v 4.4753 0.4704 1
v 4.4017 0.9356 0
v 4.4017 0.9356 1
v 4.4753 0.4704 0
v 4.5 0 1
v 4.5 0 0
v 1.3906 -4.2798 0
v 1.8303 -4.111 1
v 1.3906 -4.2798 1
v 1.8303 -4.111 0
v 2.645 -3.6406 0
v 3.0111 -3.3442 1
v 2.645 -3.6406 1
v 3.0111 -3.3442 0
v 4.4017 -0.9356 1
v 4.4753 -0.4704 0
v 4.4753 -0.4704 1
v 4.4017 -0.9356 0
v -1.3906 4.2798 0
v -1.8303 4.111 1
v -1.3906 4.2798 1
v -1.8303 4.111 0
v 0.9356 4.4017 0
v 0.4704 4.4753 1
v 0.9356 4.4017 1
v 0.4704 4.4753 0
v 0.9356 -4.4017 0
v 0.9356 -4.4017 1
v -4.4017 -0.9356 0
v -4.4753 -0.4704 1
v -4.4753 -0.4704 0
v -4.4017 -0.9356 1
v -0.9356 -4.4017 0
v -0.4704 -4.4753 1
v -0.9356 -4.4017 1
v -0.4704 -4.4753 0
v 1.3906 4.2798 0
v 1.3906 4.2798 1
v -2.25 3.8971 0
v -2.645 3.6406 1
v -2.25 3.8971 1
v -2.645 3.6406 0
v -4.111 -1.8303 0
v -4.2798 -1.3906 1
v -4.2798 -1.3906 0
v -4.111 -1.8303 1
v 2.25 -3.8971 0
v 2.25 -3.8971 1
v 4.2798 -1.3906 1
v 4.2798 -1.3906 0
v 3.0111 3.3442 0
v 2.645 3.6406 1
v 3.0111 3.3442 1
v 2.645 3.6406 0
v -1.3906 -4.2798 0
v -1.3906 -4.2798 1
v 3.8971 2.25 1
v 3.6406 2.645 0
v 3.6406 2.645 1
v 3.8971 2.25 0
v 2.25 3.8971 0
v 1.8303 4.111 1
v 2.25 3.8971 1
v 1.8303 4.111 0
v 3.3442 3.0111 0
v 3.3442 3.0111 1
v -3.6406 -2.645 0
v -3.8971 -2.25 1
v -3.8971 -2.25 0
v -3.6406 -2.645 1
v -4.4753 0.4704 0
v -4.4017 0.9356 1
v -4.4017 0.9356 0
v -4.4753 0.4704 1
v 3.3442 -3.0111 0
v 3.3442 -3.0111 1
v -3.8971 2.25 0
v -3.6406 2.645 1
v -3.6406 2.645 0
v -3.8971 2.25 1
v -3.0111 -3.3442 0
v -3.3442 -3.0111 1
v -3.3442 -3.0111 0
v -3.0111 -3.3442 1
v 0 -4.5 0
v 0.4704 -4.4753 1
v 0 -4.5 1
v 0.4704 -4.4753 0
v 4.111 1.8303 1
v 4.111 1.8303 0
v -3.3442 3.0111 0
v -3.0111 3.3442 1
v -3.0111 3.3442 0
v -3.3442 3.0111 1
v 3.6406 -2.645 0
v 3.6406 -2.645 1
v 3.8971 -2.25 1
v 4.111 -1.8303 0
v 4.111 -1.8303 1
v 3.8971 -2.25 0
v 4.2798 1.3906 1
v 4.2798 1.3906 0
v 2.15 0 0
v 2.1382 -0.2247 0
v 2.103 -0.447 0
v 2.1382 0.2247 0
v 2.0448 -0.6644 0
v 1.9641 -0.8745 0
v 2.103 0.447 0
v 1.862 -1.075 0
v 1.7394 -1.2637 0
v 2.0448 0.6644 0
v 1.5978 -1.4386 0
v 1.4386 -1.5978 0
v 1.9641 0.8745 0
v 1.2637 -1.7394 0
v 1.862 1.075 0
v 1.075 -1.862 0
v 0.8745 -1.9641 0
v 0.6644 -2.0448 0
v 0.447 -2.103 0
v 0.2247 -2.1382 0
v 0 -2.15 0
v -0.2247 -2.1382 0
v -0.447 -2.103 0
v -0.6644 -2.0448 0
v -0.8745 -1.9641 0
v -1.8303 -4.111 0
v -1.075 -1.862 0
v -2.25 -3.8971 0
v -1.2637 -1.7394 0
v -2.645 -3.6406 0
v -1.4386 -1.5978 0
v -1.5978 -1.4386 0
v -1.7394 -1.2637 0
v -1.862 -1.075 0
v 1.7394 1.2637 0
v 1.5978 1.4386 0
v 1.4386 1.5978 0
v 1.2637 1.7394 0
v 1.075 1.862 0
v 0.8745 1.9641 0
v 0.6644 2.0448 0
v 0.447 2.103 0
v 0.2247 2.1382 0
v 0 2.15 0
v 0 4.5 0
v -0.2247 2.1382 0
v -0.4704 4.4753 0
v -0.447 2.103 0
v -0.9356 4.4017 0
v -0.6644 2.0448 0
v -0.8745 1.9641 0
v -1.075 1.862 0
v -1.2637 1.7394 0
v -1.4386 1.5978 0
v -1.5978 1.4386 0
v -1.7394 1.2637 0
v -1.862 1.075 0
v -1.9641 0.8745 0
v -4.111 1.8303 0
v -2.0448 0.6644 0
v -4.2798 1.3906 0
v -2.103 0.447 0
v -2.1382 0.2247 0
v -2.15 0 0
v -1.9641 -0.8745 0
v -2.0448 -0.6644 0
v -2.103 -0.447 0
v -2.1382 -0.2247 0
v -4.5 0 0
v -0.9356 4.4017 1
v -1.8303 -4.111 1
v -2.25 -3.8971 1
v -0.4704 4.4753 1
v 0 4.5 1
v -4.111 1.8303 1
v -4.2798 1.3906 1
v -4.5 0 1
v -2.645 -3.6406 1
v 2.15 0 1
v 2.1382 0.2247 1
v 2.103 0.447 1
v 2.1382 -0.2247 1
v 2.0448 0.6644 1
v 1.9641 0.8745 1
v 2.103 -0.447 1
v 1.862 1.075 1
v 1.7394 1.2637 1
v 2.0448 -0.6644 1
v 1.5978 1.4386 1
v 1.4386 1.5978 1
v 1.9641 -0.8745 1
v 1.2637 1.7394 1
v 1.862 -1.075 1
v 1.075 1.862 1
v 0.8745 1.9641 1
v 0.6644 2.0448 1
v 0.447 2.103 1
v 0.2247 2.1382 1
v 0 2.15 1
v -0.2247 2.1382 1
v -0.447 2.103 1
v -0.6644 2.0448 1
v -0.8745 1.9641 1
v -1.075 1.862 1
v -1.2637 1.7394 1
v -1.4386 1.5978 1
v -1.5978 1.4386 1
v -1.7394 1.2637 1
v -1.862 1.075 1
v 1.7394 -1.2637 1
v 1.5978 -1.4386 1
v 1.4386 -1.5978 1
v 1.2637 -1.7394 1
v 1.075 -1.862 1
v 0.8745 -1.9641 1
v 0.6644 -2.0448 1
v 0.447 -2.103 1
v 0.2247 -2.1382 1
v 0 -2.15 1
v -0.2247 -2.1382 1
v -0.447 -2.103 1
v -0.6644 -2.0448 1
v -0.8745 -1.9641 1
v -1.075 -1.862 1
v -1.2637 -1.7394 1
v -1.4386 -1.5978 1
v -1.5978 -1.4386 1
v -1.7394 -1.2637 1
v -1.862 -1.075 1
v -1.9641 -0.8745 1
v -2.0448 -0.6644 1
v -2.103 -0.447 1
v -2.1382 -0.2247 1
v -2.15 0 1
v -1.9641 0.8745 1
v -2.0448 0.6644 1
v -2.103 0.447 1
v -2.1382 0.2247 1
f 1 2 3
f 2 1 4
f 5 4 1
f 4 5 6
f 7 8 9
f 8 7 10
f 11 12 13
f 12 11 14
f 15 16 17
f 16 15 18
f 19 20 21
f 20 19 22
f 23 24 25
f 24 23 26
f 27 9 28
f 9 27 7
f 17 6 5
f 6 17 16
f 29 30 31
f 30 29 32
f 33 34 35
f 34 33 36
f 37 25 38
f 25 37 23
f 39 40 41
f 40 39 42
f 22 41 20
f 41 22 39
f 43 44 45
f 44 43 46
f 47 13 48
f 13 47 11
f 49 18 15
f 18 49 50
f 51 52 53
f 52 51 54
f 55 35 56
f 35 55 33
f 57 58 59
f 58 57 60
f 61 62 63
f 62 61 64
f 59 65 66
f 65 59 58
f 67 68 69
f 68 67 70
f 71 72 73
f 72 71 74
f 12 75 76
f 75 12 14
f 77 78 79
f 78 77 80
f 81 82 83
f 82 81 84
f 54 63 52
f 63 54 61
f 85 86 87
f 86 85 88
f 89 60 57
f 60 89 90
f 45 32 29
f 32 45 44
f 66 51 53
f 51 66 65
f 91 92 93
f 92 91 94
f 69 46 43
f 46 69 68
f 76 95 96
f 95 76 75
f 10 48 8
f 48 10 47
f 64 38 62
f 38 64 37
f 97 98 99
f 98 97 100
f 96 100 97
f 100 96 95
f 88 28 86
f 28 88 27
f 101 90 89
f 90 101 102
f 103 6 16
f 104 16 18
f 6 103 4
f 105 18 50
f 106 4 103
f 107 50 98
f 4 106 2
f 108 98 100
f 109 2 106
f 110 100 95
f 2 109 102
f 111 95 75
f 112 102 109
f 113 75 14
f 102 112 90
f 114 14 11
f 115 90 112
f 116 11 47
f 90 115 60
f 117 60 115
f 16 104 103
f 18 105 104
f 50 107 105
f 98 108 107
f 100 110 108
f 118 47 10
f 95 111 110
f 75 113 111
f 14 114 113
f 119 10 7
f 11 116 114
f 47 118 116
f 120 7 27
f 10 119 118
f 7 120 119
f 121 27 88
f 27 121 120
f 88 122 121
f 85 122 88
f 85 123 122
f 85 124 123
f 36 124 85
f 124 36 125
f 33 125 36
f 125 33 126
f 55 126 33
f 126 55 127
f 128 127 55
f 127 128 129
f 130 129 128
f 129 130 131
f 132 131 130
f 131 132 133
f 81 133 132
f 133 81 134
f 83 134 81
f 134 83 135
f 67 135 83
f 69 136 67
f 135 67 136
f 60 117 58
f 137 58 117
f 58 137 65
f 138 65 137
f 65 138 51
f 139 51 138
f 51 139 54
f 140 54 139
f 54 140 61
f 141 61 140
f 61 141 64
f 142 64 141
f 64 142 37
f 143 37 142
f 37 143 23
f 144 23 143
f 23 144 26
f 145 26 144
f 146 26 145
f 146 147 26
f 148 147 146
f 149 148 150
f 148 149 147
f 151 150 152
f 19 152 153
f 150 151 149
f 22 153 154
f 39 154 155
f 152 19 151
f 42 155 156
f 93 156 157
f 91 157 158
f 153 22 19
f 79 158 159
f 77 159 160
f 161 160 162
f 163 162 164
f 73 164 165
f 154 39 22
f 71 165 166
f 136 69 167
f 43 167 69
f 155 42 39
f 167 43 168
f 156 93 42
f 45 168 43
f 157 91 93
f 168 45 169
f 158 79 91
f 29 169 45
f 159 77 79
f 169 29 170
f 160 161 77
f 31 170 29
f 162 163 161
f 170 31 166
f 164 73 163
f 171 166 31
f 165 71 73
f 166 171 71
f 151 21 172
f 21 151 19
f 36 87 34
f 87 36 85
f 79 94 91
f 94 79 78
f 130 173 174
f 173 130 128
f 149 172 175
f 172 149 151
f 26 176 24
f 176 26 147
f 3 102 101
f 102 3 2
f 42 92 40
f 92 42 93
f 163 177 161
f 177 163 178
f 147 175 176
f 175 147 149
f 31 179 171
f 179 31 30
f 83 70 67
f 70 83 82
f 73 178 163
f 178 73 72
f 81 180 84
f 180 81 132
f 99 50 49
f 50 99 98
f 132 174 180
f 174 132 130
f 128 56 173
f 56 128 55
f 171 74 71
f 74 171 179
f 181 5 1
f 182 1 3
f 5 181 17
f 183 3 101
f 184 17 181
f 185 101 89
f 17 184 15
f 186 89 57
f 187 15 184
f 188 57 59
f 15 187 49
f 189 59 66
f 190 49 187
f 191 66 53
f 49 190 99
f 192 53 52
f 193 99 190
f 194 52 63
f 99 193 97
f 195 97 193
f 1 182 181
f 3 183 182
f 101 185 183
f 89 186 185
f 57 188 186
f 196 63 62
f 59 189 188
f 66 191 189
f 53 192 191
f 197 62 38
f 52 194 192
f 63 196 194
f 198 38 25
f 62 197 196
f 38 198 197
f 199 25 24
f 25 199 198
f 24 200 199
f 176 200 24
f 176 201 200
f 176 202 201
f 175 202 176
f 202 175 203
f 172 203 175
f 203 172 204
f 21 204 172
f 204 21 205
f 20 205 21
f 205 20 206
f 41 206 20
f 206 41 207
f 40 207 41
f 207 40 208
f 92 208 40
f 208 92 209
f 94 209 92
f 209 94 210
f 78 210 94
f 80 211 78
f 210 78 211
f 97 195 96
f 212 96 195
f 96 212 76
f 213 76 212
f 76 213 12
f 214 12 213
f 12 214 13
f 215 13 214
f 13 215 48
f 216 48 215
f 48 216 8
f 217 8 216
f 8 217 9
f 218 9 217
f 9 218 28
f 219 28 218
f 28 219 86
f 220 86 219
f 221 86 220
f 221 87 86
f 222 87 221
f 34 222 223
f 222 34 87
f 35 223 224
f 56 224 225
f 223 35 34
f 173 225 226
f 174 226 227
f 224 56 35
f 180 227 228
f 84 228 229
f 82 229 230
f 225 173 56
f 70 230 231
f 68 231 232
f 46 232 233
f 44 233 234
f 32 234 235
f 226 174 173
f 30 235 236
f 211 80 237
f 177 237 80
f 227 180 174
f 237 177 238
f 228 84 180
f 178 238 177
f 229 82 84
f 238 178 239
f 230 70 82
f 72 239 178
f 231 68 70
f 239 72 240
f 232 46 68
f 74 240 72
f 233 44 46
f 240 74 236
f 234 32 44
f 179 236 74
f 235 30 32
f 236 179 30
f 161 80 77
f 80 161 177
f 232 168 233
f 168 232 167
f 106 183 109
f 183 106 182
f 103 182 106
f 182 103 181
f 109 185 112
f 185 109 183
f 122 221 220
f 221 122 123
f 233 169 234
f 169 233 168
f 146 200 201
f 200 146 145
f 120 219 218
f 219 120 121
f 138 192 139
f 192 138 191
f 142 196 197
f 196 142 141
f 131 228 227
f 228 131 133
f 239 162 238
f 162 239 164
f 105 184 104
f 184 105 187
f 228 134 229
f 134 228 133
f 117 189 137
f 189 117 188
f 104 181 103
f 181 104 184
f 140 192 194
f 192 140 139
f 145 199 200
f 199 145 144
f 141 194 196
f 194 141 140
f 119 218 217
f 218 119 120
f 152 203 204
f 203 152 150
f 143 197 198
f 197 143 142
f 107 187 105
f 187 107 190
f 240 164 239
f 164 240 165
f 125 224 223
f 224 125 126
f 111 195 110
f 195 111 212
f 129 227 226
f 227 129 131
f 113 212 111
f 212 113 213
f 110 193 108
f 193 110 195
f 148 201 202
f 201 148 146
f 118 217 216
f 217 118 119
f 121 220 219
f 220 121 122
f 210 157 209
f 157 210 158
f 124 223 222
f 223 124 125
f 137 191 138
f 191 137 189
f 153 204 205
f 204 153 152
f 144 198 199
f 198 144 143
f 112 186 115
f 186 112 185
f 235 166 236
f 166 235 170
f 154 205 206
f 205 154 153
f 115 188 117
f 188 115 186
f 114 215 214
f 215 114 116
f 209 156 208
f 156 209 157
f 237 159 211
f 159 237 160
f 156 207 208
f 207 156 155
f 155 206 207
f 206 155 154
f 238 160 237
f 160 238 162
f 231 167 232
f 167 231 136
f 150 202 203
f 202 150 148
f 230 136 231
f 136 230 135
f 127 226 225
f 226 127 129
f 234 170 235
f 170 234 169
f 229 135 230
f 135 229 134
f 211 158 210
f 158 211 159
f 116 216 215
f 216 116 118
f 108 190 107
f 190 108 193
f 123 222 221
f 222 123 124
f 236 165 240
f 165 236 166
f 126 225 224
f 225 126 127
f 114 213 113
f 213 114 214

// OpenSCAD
// Flat metric washer.
$fn = 60;
eps = 0.02;
inner_d = 4.3;
outer_d = 9;
thickness = 1;
difference() {
    cylinder(d = outer_d, h = thickness);
    translate([0, 0, -eps]) cylinder(d = inner_d, h = thickness + 2 * eps);
}
